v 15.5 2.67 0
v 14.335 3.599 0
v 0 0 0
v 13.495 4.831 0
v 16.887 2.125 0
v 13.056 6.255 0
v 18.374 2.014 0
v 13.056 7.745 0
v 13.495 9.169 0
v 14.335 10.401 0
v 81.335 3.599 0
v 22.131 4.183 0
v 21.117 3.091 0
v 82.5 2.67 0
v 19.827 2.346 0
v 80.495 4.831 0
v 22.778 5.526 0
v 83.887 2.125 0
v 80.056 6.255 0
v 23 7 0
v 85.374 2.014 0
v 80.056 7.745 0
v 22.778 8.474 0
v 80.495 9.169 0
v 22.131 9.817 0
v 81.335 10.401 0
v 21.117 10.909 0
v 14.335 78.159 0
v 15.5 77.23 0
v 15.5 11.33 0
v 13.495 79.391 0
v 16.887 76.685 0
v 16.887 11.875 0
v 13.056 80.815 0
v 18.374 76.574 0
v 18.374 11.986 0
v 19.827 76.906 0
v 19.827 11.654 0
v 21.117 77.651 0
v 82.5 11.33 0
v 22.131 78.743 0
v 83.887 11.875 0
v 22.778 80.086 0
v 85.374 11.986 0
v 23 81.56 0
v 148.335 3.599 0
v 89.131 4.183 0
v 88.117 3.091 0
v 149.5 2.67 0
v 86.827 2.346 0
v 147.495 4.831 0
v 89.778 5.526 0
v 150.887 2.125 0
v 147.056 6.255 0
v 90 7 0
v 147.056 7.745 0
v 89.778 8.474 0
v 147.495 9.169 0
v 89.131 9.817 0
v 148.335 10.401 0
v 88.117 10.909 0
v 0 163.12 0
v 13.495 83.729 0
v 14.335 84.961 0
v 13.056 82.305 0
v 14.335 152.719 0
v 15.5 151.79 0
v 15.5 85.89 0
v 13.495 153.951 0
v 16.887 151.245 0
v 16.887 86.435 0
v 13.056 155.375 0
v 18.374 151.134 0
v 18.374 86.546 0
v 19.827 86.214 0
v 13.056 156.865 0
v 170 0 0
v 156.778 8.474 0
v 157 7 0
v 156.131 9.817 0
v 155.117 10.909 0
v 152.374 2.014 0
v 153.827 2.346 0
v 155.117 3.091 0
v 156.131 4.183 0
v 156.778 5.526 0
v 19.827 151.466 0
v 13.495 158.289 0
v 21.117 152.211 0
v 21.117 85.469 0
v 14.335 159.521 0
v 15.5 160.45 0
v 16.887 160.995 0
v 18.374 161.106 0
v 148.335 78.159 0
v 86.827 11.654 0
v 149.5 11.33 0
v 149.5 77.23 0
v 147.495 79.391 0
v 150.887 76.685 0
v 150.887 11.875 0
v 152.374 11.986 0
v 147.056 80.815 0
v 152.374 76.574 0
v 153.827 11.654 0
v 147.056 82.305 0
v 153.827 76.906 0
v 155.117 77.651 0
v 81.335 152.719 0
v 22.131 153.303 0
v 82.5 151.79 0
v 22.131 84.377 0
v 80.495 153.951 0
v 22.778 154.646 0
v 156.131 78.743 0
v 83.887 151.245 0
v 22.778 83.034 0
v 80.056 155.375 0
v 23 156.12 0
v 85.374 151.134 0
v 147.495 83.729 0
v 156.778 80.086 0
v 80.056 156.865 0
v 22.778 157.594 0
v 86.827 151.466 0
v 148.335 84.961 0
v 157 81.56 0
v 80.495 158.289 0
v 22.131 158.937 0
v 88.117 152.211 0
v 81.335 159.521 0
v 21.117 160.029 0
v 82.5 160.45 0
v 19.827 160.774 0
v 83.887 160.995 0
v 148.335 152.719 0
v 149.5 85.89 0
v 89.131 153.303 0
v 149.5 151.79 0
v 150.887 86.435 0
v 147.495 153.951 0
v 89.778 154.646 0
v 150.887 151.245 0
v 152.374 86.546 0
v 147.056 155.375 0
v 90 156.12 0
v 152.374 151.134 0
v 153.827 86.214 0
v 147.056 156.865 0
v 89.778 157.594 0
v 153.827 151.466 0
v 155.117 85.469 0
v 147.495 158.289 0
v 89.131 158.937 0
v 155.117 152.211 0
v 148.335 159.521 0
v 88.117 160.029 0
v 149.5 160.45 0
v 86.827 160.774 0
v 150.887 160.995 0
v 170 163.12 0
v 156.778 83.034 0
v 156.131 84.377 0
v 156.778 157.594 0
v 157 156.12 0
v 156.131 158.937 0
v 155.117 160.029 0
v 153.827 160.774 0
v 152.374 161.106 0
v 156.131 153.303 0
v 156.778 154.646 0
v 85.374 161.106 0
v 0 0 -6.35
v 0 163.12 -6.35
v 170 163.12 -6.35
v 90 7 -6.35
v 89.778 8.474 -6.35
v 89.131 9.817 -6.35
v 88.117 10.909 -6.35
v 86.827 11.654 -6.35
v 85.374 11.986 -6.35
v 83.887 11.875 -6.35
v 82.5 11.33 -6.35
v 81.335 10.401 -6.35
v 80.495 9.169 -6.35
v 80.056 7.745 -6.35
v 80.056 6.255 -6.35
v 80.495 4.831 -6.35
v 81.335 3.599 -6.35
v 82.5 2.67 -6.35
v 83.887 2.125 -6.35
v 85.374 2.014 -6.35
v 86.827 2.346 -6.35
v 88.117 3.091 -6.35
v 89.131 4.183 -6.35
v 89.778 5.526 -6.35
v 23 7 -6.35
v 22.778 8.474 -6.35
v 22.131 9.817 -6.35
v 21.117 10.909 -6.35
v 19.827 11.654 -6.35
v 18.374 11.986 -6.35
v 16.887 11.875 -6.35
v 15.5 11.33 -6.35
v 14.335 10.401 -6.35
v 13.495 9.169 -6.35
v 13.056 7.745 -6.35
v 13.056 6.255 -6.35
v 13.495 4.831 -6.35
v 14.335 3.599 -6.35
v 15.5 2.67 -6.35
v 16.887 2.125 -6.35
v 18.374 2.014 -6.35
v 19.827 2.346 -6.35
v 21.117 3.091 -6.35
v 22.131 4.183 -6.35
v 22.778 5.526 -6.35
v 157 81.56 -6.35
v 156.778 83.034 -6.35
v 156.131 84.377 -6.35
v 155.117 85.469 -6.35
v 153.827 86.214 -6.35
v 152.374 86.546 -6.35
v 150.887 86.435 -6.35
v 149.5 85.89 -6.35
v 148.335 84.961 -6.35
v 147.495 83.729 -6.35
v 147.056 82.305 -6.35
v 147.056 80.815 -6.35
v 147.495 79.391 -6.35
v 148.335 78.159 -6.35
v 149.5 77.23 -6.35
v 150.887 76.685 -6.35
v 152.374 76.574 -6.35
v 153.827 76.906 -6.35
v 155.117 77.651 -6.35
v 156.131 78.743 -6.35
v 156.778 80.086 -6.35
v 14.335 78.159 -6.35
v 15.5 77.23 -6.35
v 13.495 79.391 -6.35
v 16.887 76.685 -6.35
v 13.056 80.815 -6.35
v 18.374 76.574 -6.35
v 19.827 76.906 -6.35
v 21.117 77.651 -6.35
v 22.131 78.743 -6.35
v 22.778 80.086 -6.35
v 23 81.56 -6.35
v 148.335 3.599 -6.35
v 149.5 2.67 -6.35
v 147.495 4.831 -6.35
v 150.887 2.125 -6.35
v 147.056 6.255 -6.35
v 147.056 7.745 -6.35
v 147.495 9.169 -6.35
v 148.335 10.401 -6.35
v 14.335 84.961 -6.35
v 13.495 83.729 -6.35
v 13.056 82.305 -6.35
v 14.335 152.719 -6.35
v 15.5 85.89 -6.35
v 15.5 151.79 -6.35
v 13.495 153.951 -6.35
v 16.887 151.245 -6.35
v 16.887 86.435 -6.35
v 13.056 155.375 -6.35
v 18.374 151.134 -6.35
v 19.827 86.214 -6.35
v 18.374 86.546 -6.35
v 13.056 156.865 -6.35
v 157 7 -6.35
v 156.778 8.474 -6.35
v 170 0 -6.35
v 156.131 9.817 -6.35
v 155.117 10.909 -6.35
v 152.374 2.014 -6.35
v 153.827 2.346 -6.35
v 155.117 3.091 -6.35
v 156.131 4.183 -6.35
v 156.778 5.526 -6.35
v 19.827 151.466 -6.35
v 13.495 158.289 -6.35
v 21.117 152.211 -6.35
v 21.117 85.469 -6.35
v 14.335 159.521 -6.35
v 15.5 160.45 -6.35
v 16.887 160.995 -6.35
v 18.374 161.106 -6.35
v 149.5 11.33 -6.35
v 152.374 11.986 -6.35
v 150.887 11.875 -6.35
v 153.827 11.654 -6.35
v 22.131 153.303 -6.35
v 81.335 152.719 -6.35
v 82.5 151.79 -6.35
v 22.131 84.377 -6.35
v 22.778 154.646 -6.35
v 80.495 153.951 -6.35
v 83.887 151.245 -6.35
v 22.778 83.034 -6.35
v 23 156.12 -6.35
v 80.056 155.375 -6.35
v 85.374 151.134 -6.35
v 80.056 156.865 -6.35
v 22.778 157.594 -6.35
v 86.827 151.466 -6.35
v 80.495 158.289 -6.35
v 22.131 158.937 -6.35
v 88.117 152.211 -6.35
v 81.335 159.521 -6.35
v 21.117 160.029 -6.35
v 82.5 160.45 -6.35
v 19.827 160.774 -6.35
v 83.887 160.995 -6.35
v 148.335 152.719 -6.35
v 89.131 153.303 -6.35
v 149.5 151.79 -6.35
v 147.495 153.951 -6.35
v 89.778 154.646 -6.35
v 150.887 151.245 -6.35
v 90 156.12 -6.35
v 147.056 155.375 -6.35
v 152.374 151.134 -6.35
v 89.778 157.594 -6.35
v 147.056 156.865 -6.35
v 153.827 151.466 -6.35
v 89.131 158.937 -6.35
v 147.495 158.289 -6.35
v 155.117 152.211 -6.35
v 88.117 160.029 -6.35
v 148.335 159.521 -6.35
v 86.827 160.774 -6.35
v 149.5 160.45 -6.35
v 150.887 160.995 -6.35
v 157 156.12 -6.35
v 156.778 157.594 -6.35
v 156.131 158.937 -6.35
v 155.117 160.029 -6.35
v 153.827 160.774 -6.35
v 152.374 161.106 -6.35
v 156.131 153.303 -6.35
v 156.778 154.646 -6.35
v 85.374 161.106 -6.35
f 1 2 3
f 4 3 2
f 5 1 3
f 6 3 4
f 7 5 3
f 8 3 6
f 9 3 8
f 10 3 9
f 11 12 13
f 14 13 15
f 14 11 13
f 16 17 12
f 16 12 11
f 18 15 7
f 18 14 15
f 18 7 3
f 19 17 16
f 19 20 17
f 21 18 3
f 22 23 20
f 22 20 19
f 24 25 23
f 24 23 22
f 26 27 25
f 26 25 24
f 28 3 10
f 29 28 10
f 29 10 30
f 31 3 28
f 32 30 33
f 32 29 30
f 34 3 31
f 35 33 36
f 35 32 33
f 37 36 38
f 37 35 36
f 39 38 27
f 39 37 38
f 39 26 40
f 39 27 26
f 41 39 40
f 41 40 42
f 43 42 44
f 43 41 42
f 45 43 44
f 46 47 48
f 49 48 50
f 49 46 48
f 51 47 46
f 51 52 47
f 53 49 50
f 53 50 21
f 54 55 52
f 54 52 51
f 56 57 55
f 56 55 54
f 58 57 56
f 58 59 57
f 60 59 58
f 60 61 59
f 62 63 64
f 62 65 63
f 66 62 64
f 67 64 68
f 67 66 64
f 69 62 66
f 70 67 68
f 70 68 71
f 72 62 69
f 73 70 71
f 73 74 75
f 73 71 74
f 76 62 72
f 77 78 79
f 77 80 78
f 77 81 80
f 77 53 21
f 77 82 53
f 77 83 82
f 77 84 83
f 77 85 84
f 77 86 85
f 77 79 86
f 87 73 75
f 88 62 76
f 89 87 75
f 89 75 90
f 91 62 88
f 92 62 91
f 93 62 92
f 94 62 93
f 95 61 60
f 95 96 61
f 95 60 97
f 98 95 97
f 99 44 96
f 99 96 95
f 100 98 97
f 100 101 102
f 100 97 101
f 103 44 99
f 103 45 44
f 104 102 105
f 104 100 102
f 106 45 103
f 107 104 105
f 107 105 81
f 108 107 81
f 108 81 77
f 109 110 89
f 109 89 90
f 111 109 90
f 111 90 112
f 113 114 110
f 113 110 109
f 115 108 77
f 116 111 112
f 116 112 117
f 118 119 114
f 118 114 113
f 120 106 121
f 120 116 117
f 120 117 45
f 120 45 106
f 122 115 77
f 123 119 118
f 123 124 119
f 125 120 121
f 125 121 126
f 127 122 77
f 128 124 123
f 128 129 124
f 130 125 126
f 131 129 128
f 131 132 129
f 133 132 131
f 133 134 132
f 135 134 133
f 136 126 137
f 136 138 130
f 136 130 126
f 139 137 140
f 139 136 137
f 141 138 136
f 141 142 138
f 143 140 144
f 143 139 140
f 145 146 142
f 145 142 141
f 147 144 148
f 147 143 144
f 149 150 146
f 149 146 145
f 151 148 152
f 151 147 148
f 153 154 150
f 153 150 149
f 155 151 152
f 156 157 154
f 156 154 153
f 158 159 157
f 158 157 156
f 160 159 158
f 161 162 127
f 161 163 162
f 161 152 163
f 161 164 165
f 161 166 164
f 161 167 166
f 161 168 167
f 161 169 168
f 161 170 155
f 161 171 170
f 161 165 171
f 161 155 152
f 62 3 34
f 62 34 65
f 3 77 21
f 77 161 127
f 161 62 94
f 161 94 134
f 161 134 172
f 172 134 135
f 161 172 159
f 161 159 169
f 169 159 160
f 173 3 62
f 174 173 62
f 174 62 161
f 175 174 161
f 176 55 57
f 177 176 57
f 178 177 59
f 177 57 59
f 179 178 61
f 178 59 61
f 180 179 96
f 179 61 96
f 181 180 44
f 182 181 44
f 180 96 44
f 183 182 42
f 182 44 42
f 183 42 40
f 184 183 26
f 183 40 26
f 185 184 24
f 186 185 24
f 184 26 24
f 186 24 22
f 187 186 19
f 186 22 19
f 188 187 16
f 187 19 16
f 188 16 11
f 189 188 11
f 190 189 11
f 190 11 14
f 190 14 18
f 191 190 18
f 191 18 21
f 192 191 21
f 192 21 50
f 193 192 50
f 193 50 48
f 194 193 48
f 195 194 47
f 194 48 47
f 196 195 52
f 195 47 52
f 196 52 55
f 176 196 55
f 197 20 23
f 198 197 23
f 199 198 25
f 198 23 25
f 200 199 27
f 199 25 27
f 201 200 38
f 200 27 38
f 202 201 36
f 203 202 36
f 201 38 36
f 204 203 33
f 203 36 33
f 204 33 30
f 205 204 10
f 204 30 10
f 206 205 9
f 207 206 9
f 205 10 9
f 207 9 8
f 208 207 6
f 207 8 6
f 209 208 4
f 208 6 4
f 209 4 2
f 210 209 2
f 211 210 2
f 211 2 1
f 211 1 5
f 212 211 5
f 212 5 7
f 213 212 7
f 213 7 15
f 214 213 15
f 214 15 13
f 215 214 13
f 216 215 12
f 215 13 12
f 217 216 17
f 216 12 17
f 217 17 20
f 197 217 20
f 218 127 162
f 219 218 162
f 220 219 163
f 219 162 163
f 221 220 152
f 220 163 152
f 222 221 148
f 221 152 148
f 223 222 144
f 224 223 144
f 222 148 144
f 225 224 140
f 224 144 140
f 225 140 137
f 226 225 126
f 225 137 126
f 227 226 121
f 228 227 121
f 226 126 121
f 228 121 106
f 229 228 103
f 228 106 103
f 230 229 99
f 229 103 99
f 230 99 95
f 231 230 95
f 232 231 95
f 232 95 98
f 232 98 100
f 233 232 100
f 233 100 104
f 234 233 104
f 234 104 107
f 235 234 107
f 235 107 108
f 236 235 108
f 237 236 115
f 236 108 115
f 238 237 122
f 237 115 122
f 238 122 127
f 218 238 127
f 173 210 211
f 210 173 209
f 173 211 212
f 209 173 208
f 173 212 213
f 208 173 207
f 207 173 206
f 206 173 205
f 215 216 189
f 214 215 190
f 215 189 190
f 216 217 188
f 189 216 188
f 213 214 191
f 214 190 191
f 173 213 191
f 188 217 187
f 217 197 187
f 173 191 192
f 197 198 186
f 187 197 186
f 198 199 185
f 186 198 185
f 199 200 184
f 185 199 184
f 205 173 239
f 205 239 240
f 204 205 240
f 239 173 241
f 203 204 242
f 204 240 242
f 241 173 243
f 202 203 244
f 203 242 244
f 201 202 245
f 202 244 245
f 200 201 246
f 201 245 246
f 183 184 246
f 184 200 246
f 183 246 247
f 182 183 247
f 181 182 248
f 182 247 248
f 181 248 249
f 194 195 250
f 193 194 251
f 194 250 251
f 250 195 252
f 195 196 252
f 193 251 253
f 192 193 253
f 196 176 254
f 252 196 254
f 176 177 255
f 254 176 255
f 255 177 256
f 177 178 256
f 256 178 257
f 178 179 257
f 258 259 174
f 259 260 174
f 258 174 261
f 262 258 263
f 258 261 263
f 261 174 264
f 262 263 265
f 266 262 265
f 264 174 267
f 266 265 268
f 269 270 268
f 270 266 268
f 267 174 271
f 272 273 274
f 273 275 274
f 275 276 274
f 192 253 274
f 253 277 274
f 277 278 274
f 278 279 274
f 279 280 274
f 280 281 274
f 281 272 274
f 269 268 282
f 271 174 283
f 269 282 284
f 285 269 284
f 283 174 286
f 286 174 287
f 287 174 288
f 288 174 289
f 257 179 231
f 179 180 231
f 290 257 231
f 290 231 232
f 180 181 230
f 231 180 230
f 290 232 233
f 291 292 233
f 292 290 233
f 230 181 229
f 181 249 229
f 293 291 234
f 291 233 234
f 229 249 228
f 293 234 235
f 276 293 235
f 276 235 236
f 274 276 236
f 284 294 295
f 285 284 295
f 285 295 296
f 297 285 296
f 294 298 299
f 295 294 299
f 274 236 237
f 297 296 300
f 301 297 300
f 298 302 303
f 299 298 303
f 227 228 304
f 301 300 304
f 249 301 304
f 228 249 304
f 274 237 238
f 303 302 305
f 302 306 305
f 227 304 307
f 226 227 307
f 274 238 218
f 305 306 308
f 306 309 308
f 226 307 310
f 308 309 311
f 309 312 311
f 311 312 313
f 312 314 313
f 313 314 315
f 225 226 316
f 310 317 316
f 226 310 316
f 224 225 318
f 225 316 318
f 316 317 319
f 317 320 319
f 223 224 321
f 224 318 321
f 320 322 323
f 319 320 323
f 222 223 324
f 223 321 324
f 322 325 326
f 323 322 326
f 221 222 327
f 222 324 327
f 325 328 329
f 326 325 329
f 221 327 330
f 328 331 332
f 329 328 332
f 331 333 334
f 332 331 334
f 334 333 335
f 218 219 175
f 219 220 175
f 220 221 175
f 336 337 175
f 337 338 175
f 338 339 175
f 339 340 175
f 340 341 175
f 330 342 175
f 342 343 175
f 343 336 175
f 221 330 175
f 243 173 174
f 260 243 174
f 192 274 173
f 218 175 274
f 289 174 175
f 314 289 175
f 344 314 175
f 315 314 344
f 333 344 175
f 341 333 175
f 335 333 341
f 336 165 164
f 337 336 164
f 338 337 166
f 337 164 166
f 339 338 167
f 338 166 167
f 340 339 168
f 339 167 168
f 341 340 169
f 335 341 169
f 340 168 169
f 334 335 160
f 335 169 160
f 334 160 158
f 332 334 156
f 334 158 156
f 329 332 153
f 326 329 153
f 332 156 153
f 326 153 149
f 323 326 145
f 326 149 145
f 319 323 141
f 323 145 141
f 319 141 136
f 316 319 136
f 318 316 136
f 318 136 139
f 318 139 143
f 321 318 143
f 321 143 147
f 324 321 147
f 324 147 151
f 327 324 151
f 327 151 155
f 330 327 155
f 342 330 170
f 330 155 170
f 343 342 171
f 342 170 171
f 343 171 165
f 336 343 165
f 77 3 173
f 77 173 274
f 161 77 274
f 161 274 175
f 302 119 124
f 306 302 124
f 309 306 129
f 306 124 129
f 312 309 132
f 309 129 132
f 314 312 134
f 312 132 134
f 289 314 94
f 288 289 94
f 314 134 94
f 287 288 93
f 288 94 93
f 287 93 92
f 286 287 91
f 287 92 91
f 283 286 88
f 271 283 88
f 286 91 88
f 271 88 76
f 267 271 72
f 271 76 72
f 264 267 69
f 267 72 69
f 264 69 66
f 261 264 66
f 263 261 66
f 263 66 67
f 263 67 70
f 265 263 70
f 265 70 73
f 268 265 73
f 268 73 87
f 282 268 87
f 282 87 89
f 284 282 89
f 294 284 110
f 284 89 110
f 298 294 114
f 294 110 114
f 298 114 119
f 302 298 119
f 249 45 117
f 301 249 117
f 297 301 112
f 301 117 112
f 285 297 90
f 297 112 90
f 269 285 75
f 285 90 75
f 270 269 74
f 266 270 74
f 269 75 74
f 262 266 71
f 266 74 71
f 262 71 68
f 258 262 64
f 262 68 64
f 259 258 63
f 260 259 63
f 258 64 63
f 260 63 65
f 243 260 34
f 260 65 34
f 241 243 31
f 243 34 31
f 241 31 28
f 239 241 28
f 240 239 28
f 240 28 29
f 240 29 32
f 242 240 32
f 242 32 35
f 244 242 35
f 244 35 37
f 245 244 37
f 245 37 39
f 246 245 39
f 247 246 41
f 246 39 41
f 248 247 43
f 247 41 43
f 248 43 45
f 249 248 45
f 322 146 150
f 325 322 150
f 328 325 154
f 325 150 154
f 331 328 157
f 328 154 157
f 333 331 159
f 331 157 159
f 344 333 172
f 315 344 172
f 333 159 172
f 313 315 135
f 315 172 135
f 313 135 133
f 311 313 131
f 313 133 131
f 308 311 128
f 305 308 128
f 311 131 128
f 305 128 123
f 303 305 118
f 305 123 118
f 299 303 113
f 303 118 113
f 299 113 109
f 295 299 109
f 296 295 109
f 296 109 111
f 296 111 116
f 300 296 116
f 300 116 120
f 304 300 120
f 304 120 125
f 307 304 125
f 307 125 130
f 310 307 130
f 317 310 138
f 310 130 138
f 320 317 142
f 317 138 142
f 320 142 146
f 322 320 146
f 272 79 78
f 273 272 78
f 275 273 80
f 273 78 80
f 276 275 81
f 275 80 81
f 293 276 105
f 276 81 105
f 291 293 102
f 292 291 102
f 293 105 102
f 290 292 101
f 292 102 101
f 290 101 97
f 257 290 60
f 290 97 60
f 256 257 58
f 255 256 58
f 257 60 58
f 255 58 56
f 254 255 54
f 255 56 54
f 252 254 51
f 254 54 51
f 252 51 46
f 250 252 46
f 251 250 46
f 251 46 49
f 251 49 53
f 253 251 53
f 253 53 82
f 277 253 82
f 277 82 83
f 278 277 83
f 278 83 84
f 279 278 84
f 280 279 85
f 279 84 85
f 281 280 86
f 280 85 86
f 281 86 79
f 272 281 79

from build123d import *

# Parameters (mm, degrees)
SKETCH1_W           = 170
SKETCH1_H           = 163.12
SKETCH1_R           = 5
BOSS_EXTRUDE1_DEPTH = 6.35


with BuildPart() as part:
    # Sketch1 → Boss-Extrude1 (new body)
    with BuildSketch(Plane.XY):
        with Locations((85, 81.56)):
            Rectangle(SKETCH1_W, SKETCH1_H)
        with Locations((85, 7)):
            Circle(SKETCH1_R, mode=Mode.SUBTRACT)
        with Locations((152, 7)):
            Circle(SKETCH1_R, mode=Mode.SUBTRACT)
        with Locations((18, 7)):
            Circle(SKETCH1_R, mode=Mode.SUBTRACT)
        with Locations((18, 81.56)):
            Circle(SKETCH1_R, mode=Mode.SUBTRACT)
        with Locations((18, 156.12)):
            Circle(SKETCH1_R, mode=Mode.SUBTRACT)
        with Locations((152, 81.56)):
            Circle(SKETCH1_R, mode=Mode.SUBTRACT)
        with Locations((152, 156.12)):
            Circle(SKETCH1_R, mode=Mode.SUBTRACT)
        with Locations((85, 156.12)):
            Circle(SKETCH1_R, mode=Mode.SUBTRACT)
    extrude(amount=-BOSS_EXTRUDE1_DEPTH)


solid = part.part
